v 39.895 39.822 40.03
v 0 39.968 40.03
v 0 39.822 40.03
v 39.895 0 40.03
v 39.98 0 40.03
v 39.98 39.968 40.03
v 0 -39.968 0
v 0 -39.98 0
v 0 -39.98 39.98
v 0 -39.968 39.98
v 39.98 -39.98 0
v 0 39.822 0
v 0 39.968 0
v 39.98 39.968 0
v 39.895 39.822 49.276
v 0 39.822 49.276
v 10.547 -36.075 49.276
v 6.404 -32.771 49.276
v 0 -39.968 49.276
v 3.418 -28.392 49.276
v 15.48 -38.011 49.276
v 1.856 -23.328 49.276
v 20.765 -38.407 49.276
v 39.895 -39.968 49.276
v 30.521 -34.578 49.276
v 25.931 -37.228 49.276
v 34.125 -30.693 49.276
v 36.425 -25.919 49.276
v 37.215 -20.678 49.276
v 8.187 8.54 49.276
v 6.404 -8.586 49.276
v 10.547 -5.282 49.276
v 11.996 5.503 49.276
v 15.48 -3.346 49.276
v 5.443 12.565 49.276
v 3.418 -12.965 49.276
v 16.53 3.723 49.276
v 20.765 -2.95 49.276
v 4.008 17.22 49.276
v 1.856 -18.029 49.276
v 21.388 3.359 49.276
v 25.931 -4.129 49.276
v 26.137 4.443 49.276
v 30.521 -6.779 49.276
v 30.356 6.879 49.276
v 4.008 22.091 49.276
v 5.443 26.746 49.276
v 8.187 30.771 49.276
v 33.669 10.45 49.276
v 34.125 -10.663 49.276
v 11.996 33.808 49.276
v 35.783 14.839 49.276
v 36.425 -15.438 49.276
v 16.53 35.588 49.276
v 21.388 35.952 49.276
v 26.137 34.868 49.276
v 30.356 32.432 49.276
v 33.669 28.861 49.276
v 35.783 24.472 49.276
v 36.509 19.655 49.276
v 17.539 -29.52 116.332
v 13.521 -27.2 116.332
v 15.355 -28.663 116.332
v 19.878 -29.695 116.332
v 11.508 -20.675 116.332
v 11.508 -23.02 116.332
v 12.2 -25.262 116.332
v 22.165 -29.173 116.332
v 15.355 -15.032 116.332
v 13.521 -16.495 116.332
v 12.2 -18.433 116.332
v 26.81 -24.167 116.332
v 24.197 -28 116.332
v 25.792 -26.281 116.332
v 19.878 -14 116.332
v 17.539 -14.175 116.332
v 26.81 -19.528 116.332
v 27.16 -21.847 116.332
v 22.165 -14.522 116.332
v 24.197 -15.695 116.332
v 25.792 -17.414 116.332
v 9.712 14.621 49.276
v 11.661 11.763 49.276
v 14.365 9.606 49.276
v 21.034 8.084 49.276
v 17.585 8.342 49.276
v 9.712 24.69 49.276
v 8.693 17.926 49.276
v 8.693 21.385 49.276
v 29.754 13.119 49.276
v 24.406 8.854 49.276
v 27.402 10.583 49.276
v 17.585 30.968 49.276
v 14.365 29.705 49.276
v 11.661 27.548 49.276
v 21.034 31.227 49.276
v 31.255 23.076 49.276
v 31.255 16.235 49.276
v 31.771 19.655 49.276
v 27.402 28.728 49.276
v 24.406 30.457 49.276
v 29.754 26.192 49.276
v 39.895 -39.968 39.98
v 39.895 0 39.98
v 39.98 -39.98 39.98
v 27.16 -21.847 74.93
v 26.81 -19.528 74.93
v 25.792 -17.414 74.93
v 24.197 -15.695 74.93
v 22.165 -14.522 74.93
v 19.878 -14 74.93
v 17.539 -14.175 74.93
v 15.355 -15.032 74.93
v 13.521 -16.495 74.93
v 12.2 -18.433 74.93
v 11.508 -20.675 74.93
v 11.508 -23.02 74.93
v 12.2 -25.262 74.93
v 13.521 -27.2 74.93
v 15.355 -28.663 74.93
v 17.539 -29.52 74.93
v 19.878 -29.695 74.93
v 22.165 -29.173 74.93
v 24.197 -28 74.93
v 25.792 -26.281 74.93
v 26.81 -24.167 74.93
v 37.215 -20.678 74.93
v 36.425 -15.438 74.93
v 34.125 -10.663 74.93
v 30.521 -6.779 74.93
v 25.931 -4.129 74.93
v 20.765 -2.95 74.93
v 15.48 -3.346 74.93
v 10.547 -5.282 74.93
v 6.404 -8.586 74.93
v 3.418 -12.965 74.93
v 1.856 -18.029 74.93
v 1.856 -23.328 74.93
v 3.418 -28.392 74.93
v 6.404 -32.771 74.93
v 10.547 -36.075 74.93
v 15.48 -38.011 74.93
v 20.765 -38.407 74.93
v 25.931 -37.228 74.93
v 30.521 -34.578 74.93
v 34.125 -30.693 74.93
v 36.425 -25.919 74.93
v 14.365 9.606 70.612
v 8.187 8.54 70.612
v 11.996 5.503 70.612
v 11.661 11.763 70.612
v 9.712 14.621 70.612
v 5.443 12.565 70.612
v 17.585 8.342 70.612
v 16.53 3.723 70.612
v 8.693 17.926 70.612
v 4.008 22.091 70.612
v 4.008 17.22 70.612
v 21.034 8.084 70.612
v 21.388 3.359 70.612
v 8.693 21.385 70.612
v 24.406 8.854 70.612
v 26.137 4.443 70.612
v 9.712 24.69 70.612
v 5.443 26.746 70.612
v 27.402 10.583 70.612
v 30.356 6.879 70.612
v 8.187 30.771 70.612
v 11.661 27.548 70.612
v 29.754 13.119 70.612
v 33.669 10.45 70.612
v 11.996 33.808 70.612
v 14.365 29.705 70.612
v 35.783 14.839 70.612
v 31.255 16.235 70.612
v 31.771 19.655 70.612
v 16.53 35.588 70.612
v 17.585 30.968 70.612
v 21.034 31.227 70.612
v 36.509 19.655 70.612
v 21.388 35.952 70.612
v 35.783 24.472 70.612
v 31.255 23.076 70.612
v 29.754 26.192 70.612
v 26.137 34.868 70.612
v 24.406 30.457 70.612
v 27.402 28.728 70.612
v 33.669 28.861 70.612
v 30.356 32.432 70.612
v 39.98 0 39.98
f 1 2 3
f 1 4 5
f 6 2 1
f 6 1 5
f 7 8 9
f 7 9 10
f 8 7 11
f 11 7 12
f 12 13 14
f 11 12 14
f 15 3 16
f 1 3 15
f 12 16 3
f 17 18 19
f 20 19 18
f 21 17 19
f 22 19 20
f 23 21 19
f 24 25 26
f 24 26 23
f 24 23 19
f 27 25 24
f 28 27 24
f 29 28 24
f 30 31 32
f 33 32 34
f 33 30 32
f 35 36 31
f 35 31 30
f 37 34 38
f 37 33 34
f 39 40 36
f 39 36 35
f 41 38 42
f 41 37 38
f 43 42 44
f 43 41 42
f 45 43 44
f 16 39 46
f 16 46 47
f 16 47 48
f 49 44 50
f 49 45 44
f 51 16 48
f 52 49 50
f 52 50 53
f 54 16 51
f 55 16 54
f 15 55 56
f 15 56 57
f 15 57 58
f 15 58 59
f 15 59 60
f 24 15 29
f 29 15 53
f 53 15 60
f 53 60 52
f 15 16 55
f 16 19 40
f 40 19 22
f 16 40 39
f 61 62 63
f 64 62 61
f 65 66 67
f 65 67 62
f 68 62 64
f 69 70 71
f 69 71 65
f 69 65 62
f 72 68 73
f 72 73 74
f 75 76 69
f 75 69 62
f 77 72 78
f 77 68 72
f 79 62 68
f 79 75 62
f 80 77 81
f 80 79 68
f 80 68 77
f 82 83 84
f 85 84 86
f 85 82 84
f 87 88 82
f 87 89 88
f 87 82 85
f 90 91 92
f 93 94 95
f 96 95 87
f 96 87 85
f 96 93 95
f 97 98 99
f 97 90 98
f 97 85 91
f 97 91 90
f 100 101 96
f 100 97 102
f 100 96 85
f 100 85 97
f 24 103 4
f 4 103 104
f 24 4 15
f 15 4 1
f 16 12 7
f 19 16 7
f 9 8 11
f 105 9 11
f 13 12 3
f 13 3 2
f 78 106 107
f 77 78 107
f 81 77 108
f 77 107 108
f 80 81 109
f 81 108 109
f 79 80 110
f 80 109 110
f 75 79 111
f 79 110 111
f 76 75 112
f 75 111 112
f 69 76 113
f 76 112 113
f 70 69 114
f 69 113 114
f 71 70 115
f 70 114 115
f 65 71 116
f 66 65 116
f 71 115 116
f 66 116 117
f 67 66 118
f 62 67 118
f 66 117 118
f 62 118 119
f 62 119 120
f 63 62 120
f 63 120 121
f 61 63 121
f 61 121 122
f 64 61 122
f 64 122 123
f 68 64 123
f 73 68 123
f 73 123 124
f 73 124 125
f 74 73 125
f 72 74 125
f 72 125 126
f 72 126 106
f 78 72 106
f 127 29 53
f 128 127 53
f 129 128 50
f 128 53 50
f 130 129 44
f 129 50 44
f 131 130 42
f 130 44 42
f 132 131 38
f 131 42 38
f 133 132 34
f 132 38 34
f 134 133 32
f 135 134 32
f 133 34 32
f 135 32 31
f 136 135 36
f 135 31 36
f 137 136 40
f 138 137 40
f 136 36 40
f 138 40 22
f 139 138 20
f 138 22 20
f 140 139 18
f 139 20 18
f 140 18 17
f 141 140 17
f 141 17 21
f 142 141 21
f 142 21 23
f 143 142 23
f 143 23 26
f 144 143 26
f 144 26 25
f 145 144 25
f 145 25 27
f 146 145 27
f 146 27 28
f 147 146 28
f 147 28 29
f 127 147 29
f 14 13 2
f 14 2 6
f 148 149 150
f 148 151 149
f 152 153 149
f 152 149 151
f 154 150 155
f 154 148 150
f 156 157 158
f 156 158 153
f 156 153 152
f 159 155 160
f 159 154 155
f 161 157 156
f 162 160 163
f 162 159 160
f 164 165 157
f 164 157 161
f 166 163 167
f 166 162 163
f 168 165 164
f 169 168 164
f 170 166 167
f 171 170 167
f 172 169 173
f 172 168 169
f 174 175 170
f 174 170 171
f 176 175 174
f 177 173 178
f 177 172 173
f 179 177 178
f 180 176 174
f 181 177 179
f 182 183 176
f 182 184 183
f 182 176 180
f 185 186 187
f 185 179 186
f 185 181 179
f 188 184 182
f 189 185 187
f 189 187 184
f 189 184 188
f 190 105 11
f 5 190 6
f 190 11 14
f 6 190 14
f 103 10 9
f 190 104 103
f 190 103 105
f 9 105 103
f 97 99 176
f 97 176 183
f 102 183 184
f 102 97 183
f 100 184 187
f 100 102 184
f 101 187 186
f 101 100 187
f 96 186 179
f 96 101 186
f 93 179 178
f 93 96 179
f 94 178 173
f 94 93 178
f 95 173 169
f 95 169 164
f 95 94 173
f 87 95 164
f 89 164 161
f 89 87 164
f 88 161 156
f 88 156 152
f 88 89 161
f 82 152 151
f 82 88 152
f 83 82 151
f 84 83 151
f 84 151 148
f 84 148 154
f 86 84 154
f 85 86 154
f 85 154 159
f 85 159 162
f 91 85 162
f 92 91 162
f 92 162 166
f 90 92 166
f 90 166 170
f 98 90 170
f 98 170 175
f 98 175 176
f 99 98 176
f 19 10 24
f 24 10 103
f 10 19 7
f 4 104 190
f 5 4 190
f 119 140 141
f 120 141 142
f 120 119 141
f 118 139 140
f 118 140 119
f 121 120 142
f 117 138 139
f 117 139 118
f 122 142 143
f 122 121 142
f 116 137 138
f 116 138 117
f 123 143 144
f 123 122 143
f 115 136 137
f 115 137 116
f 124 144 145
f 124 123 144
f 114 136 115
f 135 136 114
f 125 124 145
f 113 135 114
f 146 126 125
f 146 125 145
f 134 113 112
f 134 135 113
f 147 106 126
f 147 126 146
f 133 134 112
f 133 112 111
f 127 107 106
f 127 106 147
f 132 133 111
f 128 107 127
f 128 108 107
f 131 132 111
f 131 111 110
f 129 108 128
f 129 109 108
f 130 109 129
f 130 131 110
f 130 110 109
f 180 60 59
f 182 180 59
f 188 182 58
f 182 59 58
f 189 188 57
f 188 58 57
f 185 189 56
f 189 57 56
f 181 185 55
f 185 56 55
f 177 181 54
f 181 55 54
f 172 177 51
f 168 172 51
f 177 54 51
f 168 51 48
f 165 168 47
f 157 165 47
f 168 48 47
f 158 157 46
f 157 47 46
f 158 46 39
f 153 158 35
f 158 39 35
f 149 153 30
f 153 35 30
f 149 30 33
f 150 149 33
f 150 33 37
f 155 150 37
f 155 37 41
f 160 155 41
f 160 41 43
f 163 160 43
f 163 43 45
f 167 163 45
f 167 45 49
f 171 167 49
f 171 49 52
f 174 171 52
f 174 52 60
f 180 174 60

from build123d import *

# Parameters (mm, degrees)
F0_W      = 39.9796
F0_H      = 39.968465
F1_DEPTH  = 40.0304
F2_R      = 16.341879
F2_R_2    = 11.603864
F3_DEPTH  = 70.612
F4_W      = 39.9796
F4_H      = 39.9796
F5_DEPTH  = 39.9796
F6_R      = 17.778332
F7_DEPTH  = 74.93
F8_W      = 39.895397
F8_H      = 39.822329
F8_H_2    = 39.968465
F9_DEPTH  = 49.276
F10_R     = 7.86972
F11_DEPTH = 116.332


with BuildPart() as f1:
    # F0 (on Top) → F1 (new body)
    with BuildSketch(Plane.XY):
        with Locations((19.9898, 19.984232)):
            Rectangle(F0_W, F0_H)
    extrude(amount=F1_DEPTH)

    # F2 (on Top) → F3 (join)
    with BuildSketch(Plane.XY):
        with Locations((20.166904, 19.655425)):
            Circle(F2_R)
        with Locations((20.166904, 19.655425)):
            Circle(F2_R_2, mode=Mode.SUBTRACT)
    extrude(amount=F3_DEPTH)

    # F4 (on Top) → F5 (join)
    with BuildSketch(Plane.XY):
        with Locations((19.9898, -19.9898)):
            Rectangle(F4_W, F4_H)
    extrude(amount=F5_DEPTH)

    # F6 (on Top) → F7 (join)
    with BuildSketch(Plane.XY):
        with Locations((19.436218, -20.678384)):
            Circle(F6_R)
    extrude(amount=F7_DEPTH)

    # F8 (on Top) → F9 (join)
    with BuildSketch(Plane.XY):
        with Locations((19.947698, 19.911164)):
            Rectangle(F8_W, F8_H)
        with Locations((19.947698, -19.984232)):
            Rectangle(F8_W, F8_H_2)
    extrude(amount=F9_DEPTH)

    # F10 (on Top) → F11 (join)
    with BuildSketch(Plane.XY):
        with Locations((19.290084, -21.847481)):
            Circle(F10_R)
    extrude(amount=F11_DEPTH)


solid = f1.part
